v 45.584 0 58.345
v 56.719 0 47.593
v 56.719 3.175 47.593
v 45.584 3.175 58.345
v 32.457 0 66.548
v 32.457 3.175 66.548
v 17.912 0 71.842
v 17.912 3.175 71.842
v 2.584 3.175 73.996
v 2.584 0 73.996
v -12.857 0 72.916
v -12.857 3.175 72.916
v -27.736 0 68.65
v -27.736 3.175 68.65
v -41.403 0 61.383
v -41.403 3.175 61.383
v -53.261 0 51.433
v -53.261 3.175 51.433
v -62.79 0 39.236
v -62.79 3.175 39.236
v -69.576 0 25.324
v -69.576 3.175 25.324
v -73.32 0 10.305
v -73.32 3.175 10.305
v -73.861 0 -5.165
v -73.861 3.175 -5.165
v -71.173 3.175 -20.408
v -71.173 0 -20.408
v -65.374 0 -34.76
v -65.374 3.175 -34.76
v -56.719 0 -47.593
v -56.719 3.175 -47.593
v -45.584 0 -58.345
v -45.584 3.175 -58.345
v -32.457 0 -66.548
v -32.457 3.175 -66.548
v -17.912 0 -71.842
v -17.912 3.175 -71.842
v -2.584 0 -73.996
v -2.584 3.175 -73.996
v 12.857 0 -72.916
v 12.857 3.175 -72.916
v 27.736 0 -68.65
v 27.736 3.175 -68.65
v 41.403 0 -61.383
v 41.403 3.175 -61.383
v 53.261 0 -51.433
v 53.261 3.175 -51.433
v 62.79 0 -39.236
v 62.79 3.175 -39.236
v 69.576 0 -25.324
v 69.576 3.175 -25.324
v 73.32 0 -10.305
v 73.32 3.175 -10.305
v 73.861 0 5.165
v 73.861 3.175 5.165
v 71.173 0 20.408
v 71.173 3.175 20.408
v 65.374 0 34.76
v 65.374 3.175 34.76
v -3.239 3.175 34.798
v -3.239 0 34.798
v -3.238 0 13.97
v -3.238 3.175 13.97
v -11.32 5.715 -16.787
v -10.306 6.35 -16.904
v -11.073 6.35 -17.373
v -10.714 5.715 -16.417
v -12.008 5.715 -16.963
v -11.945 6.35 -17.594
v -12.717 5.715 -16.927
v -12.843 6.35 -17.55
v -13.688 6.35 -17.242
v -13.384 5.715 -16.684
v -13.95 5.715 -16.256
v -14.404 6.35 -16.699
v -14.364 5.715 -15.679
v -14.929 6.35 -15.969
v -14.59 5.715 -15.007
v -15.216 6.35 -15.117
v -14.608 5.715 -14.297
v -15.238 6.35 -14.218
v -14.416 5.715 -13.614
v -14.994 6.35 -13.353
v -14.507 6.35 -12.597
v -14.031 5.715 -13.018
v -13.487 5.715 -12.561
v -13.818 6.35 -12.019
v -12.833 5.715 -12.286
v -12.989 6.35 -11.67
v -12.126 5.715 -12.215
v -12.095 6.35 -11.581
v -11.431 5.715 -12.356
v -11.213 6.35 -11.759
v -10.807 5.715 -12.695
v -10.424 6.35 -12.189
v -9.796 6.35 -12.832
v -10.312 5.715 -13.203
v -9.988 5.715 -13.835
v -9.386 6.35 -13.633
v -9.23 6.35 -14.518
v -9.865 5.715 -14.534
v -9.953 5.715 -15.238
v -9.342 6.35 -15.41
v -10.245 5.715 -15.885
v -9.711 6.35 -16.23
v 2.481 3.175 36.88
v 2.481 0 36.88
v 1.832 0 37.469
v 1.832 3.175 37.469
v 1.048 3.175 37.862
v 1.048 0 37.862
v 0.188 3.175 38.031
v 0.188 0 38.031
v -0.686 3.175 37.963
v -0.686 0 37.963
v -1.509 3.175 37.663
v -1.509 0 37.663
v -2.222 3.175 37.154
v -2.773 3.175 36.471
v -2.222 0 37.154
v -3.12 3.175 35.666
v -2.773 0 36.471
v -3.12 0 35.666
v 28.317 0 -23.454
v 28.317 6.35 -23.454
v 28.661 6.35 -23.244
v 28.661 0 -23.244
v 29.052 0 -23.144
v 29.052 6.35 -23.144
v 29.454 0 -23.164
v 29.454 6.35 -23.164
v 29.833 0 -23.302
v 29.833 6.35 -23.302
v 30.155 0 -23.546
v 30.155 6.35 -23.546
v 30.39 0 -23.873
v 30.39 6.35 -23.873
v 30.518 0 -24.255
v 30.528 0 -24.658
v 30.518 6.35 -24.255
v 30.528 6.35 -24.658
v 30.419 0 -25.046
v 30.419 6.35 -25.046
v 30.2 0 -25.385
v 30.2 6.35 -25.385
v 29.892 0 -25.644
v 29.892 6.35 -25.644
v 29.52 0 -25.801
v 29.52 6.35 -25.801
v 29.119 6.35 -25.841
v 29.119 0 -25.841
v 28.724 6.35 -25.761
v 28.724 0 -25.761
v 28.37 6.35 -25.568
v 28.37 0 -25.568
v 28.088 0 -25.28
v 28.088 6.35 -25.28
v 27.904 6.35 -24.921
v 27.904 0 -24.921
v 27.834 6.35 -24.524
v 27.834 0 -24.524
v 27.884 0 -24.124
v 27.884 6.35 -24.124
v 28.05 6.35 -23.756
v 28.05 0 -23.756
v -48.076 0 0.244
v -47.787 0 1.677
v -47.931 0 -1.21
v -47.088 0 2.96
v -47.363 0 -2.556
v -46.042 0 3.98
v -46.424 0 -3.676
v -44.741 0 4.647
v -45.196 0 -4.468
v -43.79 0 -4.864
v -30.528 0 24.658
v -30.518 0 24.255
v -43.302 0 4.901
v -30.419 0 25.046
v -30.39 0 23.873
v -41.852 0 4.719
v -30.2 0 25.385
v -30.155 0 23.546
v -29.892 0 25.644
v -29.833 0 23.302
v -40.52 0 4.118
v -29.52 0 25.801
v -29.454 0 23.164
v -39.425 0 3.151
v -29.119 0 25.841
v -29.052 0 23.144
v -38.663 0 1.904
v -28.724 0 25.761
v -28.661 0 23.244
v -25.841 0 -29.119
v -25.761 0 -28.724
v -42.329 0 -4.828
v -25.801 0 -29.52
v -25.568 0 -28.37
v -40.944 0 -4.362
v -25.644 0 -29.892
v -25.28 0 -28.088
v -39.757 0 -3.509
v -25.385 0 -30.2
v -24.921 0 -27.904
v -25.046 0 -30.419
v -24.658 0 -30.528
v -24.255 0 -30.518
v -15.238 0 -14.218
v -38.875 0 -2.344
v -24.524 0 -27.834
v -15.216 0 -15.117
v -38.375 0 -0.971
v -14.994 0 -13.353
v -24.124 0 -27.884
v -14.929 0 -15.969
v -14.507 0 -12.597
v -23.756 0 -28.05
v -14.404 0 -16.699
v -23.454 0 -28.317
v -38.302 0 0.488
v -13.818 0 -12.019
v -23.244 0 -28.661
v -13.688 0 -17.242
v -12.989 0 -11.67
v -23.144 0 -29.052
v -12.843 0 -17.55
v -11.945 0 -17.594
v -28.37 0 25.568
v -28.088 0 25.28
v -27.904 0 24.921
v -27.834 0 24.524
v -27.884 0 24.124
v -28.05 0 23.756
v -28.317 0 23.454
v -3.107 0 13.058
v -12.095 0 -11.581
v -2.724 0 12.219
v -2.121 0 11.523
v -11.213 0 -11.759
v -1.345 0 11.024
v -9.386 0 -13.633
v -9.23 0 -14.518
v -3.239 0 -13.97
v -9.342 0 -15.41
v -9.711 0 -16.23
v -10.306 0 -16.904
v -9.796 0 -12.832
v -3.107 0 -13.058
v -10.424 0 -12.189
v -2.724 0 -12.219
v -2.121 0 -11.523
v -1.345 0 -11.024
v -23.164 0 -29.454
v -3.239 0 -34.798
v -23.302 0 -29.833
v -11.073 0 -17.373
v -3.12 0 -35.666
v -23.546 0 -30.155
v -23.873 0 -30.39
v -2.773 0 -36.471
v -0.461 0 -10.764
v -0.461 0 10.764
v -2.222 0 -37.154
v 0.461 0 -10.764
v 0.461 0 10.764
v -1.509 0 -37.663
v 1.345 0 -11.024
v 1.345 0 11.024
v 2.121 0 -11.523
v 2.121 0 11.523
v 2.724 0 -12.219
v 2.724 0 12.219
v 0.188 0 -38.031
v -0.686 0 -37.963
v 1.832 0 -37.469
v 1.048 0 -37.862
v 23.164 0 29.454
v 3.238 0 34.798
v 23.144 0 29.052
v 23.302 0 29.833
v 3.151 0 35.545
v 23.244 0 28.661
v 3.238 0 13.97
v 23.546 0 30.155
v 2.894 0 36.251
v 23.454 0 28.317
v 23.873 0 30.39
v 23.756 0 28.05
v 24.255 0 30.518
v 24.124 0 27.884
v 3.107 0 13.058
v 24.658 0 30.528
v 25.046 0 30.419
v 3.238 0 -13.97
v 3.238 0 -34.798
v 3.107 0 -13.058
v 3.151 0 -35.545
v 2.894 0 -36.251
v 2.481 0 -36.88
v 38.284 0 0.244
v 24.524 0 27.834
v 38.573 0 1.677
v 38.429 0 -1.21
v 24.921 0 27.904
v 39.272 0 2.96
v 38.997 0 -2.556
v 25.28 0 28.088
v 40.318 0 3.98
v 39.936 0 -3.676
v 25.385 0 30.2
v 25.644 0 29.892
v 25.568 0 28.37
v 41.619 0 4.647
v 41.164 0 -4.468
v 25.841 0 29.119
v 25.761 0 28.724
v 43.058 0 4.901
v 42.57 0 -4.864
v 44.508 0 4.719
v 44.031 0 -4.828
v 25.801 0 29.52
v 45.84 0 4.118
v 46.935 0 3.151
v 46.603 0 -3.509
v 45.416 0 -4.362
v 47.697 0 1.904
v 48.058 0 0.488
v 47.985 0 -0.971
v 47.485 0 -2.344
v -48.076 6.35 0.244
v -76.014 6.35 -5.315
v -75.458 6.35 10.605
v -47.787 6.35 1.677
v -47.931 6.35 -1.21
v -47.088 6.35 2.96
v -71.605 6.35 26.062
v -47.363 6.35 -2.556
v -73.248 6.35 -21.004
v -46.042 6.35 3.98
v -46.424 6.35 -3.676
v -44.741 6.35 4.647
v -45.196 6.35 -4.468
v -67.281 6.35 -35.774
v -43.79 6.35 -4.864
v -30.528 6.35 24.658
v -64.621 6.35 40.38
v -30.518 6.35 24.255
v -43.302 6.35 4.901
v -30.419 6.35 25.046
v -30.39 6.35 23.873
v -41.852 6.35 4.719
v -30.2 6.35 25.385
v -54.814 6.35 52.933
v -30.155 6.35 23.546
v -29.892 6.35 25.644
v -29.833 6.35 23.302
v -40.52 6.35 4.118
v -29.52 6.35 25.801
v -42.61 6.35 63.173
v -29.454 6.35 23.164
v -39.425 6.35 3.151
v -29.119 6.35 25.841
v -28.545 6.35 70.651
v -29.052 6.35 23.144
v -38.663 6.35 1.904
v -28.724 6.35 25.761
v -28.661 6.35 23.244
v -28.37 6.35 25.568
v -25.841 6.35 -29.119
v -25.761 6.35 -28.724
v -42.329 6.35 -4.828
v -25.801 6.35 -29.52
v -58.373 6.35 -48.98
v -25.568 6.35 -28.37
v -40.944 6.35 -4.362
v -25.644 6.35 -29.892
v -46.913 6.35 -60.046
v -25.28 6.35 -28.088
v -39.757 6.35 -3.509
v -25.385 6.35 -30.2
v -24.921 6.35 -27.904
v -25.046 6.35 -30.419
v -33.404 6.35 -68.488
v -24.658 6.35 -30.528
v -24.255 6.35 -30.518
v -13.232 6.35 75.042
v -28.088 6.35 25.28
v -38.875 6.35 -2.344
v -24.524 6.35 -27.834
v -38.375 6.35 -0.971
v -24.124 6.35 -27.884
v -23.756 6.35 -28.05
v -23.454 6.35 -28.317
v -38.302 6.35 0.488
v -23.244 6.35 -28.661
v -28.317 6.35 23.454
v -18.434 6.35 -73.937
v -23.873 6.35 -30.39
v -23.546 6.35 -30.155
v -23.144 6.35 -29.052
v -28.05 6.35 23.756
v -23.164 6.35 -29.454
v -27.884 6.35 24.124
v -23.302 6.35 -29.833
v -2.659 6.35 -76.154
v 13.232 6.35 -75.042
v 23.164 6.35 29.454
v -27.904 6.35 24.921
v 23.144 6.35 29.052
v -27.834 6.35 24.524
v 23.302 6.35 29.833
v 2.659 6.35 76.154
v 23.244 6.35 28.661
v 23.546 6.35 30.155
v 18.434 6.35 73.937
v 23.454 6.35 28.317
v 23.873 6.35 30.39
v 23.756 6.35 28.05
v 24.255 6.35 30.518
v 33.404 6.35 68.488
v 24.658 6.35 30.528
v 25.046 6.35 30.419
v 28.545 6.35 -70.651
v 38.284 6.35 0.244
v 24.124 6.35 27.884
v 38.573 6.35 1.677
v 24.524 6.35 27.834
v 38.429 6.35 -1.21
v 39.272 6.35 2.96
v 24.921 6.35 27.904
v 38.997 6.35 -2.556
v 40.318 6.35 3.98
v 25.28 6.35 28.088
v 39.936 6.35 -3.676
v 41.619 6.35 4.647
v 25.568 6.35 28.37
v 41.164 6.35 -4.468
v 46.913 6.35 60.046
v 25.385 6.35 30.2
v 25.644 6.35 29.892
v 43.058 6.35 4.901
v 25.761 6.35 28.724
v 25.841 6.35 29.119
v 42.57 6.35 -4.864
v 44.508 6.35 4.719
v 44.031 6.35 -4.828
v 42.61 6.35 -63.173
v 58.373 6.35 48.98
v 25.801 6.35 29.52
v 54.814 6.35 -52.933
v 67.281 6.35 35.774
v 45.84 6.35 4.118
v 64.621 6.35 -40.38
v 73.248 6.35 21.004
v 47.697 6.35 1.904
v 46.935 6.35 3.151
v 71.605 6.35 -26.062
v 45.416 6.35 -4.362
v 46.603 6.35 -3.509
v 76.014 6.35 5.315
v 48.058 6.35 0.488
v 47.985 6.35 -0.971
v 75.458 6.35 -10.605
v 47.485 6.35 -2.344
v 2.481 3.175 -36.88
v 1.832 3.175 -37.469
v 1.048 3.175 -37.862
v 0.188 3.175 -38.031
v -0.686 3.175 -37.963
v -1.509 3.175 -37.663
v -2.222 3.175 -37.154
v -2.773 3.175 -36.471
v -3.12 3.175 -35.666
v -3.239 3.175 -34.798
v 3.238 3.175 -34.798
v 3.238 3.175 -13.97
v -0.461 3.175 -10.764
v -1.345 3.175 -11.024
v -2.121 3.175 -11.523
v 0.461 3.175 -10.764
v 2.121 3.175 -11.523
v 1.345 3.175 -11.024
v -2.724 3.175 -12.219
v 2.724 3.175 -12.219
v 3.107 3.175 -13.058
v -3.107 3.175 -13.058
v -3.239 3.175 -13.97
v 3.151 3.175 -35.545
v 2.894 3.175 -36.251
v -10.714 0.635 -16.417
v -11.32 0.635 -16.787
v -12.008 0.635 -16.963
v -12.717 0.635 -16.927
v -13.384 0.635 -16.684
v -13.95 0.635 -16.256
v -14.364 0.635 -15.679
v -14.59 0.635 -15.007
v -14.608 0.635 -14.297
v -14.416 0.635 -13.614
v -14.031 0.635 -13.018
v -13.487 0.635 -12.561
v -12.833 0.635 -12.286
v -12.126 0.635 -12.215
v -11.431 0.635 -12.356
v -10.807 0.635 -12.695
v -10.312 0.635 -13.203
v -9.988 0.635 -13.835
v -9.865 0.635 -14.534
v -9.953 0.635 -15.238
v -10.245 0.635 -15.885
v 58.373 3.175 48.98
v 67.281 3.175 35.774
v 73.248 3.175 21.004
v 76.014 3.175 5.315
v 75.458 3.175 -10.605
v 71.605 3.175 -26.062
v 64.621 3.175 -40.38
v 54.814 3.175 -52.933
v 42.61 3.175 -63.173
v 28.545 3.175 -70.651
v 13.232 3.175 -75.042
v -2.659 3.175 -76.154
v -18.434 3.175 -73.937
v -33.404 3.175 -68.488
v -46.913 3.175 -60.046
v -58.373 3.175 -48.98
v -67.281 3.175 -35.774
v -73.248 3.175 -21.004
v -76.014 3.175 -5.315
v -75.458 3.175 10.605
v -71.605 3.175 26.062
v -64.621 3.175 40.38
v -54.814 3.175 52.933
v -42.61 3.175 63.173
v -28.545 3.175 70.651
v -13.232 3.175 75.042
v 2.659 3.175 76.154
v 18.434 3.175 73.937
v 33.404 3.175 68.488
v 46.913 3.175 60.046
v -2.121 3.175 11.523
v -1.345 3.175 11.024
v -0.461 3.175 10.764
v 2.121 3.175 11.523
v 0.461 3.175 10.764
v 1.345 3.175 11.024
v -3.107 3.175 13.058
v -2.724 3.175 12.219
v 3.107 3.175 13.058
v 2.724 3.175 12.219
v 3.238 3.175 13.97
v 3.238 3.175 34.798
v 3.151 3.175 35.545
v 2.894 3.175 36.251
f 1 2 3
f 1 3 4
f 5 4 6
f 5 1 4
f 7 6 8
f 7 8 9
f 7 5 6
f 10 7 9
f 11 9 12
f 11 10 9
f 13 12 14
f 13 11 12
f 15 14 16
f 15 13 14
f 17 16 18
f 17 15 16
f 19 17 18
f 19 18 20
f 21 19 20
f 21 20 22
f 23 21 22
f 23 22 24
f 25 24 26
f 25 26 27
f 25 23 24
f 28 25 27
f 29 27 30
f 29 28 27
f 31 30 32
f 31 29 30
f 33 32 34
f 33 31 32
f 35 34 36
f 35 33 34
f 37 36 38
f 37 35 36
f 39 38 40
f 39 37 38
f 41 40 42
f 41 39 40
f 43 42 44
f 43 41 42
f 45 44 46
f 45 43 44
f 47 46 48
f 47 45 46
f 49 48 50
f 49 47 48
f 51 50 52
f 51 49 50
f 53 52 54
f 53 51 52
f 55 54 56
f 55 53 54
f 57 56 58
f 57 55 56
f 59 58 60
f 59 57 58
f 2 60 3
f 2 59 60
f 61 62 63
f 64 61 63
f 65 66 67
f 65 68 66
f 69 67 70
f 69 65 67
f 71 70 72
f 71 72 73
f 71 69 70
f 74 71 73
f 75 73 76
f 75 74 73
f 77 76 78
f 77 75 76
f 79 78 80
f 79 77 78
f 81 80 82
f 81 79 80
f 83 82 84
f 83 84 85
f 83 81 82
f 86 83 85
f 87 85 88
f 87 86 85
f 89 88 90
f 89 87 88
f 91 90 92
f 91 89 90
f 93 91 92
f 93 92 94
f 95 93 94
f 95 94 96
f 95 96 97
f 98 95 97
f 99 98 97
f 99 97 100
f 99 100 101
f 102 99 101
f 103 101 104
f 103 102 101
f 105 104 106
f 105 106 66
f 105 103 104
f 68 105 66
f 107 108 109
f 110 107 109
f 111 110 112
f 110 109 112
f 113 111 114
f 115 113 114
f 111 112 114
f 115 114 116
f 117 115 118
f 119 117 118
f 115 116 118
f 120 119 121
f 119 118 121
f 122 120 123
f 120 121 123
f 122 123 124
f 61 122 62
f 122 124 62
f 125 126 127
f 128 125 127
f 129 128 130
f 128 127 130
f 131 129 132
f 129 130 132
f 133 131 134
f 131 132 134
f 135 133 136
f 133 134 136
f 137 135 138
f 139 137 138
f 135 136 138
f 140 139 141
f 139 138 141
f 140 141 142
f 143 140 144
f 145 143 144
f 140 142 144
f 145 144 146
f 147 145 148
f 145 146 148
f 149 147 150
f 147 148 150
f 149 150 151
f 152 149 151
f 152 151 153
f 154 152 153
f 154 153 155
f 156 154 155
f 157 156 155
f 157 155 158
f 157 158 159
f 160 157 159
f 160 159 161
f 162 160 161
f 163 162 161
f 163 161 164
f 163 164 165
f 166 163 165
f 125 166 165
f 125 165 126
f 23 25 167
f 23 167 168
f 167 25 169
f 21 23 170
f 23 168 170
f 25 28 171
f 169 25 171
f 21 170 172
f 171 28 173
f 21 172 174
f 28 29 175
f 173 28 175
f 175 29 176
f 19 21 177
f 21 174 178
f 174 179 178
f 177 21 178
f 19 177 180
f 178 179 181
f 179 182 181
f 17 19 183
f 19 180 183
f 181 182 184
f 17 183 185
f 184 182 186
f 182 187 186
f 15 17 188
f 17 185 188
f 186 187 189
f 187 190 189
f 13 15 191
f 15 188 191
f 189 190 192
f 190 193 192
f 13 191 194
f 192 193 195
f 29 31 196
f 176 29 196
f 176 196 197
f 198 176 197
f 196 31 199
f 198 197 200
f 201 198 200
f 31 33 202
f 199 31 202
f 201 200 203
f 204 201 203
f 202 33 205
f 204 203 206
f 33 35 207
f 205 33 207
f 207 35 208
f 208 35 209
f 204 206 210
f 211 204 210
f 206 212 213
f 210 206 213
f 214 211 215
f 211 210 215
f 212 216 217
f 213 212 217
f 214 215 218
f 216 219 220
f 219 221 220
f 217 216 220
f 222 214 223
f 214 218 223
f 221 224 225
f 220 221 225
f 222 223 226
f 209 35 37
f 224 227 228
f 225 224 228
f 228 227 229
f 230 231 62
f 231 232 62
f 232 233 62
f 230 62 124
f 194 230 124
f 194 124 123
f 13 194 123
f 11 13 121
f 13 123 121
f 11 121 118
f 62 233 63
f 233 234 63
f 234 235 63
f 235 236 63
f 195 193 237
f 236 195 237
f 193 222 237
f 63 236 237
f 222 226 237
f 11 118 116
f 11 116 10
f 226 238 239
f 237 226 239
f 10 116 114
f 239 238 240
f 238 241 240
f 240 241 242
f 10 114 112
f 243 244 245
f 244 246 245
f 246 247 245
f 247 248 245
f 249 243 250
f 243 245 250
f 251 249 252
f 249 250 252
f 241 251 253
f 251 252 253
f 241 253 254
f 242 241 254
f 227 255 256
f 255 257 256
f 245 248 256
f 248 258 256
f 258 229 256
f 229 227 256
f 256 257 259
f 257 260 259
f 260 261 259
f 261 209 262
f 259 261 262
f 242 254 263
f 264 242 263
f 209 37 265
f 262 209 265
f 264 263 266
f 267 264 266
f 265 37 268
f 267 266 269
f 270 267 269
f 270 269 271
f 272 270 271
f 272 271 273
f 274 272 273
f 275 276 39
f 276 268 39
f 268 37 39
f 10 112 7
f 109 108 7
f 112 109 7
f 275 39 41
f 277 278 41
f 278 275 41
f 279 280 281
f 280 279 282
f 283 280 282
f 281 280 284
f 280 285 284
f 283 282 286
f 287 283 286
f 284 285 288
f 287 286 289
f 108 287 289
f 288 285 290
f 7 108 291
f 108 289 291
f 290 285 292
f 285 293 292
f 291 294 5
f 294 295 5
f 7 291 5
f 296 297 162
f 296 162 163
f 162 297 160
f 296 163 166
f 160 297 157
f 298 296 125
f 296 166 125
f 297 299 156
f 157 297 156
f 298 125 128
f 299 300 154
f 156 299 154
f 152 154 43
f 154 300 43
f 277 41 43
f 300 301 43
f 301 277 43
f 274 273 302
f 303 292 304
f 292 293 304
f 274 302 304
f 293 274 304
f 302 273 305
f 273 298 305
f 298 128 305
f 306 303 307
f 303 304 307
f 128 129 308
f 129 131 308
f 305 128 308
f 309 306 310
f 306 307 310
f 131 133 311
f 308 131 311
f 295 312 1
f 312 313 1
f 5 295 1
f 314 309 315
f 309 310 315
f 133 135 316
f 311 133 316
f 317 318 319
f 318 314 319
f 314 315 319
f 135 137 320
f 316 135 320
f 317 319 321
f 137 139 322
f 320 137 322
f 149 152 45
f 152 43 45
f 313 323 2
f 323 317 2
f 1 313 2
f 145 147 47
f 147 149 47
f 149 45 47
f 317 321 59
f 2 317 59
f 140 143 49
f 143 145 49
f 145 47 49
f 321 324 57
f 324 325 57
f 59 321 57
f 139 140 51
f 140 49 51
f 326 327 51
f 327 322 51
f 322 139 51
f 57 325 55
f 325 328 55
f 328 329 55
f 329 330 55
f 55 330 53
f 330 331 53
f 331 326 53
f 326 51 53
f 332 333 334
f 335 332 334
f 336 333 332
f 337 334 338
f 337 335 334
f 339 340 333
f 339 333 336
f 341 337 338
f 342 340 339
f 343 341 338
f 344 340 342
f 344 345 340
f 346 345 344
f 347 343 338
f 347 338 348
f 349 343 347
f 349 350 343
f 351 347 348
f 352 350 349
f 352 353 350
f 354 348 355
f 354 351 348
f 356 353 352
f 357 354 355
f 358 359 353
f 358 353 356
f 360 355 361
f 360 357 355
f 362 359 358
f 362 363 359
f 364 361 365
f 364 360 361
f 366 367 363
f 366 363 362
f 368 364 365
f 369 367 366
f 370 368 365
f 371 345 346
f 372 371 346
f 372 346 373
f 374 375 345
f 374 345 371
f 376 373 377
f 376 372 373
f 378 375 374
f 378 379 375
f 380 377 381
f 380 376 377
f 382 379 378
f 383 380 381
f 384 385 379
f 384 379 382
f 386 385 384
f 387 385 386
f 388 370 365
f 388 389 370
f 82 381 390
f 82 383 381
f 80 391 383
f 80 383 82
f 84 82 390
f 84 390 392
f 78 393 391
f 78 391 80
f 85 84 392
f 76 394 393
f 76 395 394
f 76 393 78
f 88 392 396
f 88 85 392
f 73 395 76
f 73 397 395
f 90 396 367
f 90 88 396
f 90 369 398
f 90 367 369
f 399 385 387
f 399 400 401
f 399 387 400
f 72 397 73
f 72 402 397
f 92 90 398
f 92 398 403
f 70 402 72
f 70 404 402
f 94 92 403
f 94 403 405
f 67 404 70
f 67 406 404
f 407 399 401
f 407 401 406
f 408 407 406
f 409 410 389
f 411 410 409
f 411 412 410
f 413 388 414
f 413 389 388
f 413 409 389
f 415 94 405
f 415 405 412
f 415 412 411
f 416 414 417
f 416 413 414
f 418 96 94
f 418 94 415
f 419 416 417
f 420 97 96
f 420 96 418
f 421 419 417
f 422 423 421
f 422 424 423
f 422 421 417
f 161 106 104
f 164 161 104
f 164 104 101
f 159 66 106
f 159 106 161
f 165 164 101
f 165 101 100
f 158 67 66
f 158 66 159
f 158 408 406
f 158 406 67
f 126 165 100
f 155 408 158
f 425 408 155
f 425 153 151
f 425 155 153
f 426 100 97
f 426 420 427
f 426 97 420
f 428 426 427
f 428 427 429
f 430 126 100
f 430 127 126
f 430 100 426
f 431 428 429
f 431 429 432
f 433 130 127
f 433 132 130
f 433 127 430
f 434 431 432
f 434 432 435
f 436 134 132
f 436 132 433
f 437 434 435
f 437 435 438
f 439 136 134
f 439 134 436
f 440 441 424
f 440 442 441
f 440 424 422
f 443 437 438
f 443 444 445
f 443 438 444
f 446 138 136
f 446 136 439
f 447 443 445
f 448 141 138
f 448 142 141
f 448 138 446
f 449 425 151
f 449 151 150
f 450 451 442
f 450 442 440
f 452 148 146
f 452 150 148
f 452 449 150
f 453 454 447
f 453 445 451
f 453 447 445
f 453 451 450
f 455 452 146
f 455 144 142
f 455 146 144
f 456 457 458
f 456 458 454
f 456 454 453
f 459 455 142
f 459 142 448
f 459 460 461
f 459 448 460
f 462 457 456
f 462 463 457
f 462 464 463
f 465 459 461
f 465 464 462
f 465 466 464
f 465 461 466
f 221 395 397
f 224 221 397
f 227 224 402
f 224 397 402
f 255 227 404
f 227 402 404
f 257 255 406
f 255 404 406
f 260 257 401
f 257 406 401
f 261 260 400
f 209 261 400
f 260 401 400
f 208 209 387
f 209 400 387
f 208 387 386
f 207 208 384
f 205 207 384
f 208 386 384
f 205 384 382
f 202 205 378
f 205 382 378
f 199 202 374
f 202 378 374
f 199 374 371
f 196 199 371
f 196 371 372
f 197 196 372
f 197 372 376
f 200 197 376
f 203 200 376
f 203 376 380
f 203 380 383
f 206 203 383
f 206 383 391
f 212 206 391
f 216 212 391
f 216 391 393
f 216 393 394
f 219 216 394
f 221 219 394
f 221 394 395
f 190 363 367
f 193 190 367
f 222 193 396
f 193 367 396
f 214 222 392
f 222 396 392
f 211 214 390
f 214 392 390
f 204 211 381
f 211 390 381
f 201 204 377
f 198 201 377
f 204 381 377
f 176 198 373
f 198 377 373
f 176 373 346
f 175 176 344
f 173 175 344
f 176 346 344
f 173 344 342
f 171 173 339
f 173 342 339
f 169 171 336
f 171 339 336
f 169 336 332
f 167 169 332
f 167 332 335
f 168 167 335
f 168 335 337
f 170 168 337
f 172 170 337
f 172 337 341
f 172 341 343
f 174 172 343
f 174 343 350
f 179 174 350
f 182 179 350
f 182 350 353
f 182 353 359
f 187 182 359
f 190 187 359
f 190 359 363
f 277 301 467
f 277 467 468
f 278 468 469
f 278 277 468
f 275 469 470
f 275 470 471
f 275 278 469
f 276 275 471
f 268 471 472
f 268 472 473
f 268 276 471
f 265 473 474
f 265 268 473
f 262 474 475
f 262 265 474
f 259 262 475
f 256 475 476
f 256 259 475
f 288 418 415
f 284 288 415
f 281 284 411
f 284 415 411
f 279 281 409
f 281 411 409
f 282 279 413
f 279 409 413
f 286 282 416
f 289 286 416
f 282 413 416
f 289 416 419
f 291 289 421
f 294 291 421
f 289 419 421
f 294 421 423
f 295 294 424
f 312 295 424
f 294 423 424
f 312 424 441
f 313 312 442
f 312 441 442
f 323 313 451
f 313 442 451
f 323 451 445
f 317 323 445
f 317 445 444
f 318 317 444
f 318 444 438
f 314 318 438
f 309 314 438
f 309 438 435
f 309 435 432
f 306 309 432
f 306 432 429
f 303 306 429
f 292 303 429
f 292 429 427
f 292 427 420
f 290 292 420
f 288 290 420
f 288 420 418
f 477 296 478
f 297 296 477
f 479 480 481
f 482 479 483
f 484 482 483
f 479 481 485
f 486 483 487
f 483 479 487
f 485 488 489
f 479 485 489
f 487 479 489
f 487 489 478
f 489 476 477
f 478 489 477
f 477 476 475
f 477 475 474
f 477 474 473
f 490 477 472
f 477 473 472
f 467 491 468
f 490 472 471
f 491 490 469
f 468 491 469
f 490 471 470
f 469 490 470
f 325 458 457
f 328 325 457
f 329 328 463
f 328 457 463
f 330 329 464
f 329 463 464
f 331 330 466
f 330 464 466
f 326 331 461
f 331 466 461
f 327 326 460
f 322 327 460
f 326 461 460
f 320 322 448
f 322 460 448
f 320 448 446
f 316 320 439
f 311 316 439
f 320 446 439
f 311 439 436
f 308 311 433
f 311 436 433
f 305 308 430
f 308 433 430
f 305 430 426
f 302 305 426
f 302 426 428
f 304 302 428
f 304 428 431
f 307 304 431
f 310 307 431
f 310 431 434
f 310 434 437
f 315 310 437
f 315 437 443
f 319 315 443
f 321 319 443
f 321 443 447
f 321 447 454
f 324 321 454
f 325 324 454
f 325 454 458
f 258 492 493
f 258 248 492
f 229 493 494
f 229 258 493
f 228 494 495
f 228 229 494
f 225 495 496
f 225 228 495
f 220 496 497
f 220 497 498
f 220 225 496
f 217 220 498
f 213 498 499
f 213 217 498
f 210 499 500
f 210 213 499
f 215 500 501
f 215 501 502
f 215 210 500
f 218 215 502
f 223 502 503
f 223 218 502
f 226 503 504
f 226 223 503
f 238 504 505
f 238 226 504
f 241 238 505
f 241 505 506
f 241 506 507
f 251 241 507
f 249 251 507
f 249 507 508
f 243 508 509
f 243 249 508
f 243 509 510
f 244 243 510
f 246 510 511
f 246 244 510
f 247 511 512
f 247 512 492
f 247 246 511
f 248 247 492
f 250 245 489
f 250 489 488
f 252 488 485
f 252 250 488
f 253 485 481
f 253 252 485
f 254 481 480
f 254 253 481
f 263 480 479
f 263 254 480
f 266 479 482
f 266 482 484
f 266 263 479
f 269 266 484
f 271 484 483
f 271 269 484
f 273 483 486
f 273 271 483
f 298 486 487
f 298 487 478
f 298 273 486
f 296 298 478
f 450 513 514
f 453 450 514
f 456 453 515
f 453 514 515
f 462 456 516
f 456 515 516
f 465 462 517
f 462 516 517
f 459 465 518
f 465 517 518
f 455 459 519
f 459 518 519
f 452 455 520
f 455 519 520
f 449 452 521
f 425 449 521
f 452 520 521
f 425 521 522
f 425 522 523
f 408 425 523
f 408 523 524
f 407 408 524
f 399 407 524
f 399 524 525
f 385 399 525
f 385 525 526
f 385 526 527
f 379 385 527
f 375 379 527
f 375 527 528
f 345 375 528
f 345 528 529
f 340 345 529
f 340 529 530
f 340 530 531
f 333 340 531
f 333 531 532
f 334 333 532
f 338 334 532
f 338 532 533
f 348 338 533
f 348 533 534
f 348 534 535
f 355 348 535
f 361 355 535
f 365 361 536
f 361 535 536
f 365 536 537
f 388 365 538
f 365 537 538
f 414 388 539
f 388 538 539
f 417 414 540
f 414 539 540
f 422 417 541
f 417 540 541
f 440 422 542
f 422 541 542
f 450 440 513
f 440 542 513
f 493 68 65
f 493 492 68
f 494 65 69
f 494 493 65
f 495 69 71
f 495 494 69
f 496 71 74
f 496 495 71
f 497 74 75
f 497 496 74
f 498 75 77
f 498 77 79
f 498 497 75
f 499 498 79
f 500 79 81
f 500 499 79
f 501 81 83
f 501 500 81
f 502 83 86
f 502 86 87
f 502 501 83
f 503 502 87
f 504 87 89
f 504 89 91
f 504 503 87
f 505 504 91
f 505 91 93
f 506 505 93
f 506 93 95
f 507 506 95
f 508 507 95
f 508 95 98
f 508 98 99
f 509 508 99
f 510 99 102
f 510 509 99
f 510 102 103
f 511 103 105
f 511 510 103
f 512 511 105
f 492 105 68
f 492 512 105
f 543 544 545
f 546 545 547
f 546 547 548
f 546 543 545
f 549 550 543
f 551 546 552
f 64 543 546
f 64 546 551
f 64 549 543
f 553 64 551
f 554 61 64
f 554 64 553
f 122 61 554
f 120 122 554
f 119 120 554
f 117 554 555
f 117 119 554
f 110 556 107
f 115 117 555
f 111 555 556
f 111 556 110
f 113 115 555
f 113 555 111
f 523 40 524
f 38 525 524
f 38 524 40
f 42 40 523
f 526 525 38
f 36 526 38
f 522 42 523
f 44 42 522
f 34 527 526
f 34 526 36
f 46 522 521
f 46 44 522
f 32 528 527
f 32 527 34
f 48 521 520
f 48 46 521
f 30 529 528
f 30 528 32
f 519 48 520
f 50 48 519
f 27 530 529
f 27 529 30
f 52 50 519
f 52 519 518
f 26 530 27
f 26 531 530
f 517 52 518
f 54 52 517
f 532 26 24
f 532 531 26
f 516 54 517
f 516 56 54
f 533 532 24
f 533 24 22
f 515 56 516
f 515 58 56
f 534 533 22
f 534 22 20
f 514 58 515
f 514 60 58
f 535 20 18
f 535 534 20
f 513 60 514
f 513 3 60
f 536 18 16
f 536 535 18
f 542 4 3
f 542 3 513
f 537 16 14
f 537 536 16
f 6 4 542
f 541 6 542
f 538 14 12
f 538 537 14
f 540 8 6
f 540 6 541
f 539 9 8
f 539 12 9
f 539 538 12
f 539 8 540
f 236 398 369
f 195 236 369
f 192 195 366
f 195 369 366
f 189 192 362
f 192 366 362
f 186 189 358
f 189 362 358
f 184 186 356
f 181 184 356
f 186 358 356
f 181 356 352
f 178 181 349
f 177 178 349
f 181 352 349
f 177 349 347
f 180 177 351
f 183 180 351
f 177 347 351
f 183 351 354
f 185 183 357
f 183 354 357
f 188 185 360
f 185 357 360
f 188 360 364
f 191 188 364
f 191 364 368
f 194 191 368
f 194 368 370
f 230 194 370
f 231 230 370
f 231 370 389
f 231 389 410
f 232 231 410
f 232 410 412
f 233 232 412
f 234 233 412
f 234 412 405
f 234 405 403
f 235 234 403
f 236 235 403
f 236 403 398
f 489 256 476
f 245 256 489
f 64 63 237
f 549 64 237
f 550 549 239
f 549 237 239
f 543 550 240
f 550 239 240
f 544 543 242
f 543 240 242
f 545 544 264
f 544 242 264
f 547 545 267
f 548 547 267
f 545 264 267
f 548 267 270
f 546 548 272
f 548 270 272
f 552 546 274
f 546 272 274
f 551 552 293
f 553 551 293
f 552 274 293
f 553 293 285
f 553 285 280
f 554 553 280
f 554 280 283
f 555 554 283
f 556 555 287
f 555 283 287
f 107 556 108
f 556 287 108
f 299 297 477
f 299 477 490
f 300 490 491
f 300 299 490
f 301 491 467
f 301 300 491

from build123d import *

# Parameters (mm, degrees)
SKETCH1_R                 = 76.2
BOSS_EXTRUDE1_DEPTH       = 6.35
TAP_DRILL_FOR_6_32_TAP1_D = 2.7051
CIRPATTERN1_COUNT         = 4
W_0_386_DIAMETER_HOLE1_D  = 9.8044
CUT_EXTRUDE4_DEPTH        = 3.175
SKETCH15_R                = 76.2
SKETCH15_R_2              = 74.041
CUT_EXTRUDE5_DEPTH        = 3.175
BODY_MOVE_COPY1_ANGLE     = 40


with BuildPart() as part:
    # Sketch1 → Boss-Extrude1 (new body)
    with BuildSketch(Plane(origin=(0, 0, 0), x_dir=(1, 0, 0), z_dir=(0, 1, 0))):
        Circle(SKETCH1_R)
    extrude(amount=BOSS_EXTRUDE1_DEPTH)

    # Tap Drill for #6-32 Tap1 (through all)
    with Locations(Plane(origin=(0, 0, 0), x_dir=(-1, 0, 0), z_dir=(0, -1, 0))):
        with Locations((37.52117539, 6.615995569)):
            tap_drill_for_6_32_tap1 = Hole(TAP_DRILL_FOR_6_32_TAP1_D / 2)

    # CirPattern1: Tap Drill for #6-32 Tap1 ×4 about axis
    cirpattern1_axis = Axis((0, 0, 0), (0, 1, 0))
    for i in range(1, CIRPATTERN1_COUNT):
        add(tap_drill_for_6_32_tap1.rotate(cirpattern1_axis, i * 360 / CIRPATTERN1_COUNT), mode=Mode.SUBTRACT)

    # W (0.386) Diameter Hole1 (through all)
    with Locations(Plane(origin=(0, 0, 0), x_dir=(-1, 0, 0), z_dir=(0, -1, 0))):
        with Locations((-33.077799054, 27.755568986), (33.077799054, -27.755568986)):
            Hole(W_0_386_DIAMETER_HOLE1_D / 2)

    # Sketch11 → 3/16 (0.1875) Diameter Hole1 (revolve, cut)
    with BuildSketch(Plane(origin=(-18.760587695, 0, -3.307997785), x_dir=(0, 0, -1), z_dir=(1, 0, 0))):
        Polygon((0, 0), (0, 6.35), (3.01625, 6.35), (2.38125, 5.715), (2.38125, 0.635), (3.01625, 0), align=None)
    revolve(axis=Axis((-18.760587695, -6.35, -3.307997785), (0, 1, 0)), mode=Mode.SUBTRACT)

    # Sketch12 → Cut-Extrude4 (cut)
    with BuildSketch(Plane.XZ):
        with BuildLine():
            ThreePointArc((24.848558171, 24.575146858), (20.286055568, 24.175979603), (19.886888313, 28.738482206))
            Line((19.886888313, 28.738482206), (6.498907978, 12.783308544))
            ThreePointArc((6.498907978, 12.783308544), (10.087375141, 13.744835423), (12.218242907, 10.70164087))
            ThreePointArc((12.218242907, 10.70164087), (12.02293746, 9.594008636), (11.460577836, 8.619973196))
            Line((11.460577836, 8.619973196), (24.848558171, 24.575146858))
        make_face()
        with BuildLine():
            ThreePointArc((25.606223242, 26.656814532), (23.475355476, 29.700009084), (19.886888313, 28.738482206))
            Line((19.886888313, 28.738482206), (24.848558171, 24.575146858))
            ThreePointArc((24.848558171, 24.575146858), (25.410917794, 25.549182297), (25.606223242, 26.656814532))
        make_face()
        with BuildLine():
            Line((24.848558171, 24.575146858), (19.886888313, 28.738482206))
            ThreePointArc((19.886888313, 28.738482206), (20.286055568, 24.175979603), (24.848558171, 24.575146858))
        make_face()
        with BuildLine():
            ThreePointArc((12.218242907, 10.70164087), (10.087375141, 13.744835423), (6.498907978, 12.783308544))
            Line((6.498907978, 12.783308544), (11.460577836, 8.619973196))
            ThreePointArc((11.460577836, 8.619973196), (12.02293746, 9.594008636), (12.218242907, 10.70164087))
        make_face()
        with BuildLine():
            Line((11.460577836, 8.619973196), (6.498907978, 12.783308544))
            ThreePointArc((6.498907978, 12.783308544), (6.898075233, 8.220805941), (11.460577836, 8.619973196))
        make_face()
    cut_extrude4 = extrude(amount=-CUT_EXTRUDE4_DEPTH, mode=Mode.SUBTRACT)

    # Mirror1: Cut-Extrude4 across plane
    add(cut_extrude4.mirror(Plane(origin=(0, 0, 0), x_dir=(-0.766044443, 0, 0.64278761), z_dir=(0.64278761, 0, 0.766044443))), mode=Mode.SUBTRACT)

    # Sketch15 → Cut-Extrude5 (cut)
    with BuildSketch(Plane.XZ):
        Circle(SKETCH15_R)
        Circle(SKETCH15_R_2, mode=Mode.SUBTRACT)
    extrude(amount=-CUT_EXTRUDE5_DEPTH, mode=Mode.SUBTRACT)


with BuildPart() as part_1:
    # Body-Move/Copy1: moved
    add(part.part.rotate(Axis((0, 0, 0), (0, -1, 0)), BODY_MOVE_COPY1_ANGLE))


solid = part_1.part
